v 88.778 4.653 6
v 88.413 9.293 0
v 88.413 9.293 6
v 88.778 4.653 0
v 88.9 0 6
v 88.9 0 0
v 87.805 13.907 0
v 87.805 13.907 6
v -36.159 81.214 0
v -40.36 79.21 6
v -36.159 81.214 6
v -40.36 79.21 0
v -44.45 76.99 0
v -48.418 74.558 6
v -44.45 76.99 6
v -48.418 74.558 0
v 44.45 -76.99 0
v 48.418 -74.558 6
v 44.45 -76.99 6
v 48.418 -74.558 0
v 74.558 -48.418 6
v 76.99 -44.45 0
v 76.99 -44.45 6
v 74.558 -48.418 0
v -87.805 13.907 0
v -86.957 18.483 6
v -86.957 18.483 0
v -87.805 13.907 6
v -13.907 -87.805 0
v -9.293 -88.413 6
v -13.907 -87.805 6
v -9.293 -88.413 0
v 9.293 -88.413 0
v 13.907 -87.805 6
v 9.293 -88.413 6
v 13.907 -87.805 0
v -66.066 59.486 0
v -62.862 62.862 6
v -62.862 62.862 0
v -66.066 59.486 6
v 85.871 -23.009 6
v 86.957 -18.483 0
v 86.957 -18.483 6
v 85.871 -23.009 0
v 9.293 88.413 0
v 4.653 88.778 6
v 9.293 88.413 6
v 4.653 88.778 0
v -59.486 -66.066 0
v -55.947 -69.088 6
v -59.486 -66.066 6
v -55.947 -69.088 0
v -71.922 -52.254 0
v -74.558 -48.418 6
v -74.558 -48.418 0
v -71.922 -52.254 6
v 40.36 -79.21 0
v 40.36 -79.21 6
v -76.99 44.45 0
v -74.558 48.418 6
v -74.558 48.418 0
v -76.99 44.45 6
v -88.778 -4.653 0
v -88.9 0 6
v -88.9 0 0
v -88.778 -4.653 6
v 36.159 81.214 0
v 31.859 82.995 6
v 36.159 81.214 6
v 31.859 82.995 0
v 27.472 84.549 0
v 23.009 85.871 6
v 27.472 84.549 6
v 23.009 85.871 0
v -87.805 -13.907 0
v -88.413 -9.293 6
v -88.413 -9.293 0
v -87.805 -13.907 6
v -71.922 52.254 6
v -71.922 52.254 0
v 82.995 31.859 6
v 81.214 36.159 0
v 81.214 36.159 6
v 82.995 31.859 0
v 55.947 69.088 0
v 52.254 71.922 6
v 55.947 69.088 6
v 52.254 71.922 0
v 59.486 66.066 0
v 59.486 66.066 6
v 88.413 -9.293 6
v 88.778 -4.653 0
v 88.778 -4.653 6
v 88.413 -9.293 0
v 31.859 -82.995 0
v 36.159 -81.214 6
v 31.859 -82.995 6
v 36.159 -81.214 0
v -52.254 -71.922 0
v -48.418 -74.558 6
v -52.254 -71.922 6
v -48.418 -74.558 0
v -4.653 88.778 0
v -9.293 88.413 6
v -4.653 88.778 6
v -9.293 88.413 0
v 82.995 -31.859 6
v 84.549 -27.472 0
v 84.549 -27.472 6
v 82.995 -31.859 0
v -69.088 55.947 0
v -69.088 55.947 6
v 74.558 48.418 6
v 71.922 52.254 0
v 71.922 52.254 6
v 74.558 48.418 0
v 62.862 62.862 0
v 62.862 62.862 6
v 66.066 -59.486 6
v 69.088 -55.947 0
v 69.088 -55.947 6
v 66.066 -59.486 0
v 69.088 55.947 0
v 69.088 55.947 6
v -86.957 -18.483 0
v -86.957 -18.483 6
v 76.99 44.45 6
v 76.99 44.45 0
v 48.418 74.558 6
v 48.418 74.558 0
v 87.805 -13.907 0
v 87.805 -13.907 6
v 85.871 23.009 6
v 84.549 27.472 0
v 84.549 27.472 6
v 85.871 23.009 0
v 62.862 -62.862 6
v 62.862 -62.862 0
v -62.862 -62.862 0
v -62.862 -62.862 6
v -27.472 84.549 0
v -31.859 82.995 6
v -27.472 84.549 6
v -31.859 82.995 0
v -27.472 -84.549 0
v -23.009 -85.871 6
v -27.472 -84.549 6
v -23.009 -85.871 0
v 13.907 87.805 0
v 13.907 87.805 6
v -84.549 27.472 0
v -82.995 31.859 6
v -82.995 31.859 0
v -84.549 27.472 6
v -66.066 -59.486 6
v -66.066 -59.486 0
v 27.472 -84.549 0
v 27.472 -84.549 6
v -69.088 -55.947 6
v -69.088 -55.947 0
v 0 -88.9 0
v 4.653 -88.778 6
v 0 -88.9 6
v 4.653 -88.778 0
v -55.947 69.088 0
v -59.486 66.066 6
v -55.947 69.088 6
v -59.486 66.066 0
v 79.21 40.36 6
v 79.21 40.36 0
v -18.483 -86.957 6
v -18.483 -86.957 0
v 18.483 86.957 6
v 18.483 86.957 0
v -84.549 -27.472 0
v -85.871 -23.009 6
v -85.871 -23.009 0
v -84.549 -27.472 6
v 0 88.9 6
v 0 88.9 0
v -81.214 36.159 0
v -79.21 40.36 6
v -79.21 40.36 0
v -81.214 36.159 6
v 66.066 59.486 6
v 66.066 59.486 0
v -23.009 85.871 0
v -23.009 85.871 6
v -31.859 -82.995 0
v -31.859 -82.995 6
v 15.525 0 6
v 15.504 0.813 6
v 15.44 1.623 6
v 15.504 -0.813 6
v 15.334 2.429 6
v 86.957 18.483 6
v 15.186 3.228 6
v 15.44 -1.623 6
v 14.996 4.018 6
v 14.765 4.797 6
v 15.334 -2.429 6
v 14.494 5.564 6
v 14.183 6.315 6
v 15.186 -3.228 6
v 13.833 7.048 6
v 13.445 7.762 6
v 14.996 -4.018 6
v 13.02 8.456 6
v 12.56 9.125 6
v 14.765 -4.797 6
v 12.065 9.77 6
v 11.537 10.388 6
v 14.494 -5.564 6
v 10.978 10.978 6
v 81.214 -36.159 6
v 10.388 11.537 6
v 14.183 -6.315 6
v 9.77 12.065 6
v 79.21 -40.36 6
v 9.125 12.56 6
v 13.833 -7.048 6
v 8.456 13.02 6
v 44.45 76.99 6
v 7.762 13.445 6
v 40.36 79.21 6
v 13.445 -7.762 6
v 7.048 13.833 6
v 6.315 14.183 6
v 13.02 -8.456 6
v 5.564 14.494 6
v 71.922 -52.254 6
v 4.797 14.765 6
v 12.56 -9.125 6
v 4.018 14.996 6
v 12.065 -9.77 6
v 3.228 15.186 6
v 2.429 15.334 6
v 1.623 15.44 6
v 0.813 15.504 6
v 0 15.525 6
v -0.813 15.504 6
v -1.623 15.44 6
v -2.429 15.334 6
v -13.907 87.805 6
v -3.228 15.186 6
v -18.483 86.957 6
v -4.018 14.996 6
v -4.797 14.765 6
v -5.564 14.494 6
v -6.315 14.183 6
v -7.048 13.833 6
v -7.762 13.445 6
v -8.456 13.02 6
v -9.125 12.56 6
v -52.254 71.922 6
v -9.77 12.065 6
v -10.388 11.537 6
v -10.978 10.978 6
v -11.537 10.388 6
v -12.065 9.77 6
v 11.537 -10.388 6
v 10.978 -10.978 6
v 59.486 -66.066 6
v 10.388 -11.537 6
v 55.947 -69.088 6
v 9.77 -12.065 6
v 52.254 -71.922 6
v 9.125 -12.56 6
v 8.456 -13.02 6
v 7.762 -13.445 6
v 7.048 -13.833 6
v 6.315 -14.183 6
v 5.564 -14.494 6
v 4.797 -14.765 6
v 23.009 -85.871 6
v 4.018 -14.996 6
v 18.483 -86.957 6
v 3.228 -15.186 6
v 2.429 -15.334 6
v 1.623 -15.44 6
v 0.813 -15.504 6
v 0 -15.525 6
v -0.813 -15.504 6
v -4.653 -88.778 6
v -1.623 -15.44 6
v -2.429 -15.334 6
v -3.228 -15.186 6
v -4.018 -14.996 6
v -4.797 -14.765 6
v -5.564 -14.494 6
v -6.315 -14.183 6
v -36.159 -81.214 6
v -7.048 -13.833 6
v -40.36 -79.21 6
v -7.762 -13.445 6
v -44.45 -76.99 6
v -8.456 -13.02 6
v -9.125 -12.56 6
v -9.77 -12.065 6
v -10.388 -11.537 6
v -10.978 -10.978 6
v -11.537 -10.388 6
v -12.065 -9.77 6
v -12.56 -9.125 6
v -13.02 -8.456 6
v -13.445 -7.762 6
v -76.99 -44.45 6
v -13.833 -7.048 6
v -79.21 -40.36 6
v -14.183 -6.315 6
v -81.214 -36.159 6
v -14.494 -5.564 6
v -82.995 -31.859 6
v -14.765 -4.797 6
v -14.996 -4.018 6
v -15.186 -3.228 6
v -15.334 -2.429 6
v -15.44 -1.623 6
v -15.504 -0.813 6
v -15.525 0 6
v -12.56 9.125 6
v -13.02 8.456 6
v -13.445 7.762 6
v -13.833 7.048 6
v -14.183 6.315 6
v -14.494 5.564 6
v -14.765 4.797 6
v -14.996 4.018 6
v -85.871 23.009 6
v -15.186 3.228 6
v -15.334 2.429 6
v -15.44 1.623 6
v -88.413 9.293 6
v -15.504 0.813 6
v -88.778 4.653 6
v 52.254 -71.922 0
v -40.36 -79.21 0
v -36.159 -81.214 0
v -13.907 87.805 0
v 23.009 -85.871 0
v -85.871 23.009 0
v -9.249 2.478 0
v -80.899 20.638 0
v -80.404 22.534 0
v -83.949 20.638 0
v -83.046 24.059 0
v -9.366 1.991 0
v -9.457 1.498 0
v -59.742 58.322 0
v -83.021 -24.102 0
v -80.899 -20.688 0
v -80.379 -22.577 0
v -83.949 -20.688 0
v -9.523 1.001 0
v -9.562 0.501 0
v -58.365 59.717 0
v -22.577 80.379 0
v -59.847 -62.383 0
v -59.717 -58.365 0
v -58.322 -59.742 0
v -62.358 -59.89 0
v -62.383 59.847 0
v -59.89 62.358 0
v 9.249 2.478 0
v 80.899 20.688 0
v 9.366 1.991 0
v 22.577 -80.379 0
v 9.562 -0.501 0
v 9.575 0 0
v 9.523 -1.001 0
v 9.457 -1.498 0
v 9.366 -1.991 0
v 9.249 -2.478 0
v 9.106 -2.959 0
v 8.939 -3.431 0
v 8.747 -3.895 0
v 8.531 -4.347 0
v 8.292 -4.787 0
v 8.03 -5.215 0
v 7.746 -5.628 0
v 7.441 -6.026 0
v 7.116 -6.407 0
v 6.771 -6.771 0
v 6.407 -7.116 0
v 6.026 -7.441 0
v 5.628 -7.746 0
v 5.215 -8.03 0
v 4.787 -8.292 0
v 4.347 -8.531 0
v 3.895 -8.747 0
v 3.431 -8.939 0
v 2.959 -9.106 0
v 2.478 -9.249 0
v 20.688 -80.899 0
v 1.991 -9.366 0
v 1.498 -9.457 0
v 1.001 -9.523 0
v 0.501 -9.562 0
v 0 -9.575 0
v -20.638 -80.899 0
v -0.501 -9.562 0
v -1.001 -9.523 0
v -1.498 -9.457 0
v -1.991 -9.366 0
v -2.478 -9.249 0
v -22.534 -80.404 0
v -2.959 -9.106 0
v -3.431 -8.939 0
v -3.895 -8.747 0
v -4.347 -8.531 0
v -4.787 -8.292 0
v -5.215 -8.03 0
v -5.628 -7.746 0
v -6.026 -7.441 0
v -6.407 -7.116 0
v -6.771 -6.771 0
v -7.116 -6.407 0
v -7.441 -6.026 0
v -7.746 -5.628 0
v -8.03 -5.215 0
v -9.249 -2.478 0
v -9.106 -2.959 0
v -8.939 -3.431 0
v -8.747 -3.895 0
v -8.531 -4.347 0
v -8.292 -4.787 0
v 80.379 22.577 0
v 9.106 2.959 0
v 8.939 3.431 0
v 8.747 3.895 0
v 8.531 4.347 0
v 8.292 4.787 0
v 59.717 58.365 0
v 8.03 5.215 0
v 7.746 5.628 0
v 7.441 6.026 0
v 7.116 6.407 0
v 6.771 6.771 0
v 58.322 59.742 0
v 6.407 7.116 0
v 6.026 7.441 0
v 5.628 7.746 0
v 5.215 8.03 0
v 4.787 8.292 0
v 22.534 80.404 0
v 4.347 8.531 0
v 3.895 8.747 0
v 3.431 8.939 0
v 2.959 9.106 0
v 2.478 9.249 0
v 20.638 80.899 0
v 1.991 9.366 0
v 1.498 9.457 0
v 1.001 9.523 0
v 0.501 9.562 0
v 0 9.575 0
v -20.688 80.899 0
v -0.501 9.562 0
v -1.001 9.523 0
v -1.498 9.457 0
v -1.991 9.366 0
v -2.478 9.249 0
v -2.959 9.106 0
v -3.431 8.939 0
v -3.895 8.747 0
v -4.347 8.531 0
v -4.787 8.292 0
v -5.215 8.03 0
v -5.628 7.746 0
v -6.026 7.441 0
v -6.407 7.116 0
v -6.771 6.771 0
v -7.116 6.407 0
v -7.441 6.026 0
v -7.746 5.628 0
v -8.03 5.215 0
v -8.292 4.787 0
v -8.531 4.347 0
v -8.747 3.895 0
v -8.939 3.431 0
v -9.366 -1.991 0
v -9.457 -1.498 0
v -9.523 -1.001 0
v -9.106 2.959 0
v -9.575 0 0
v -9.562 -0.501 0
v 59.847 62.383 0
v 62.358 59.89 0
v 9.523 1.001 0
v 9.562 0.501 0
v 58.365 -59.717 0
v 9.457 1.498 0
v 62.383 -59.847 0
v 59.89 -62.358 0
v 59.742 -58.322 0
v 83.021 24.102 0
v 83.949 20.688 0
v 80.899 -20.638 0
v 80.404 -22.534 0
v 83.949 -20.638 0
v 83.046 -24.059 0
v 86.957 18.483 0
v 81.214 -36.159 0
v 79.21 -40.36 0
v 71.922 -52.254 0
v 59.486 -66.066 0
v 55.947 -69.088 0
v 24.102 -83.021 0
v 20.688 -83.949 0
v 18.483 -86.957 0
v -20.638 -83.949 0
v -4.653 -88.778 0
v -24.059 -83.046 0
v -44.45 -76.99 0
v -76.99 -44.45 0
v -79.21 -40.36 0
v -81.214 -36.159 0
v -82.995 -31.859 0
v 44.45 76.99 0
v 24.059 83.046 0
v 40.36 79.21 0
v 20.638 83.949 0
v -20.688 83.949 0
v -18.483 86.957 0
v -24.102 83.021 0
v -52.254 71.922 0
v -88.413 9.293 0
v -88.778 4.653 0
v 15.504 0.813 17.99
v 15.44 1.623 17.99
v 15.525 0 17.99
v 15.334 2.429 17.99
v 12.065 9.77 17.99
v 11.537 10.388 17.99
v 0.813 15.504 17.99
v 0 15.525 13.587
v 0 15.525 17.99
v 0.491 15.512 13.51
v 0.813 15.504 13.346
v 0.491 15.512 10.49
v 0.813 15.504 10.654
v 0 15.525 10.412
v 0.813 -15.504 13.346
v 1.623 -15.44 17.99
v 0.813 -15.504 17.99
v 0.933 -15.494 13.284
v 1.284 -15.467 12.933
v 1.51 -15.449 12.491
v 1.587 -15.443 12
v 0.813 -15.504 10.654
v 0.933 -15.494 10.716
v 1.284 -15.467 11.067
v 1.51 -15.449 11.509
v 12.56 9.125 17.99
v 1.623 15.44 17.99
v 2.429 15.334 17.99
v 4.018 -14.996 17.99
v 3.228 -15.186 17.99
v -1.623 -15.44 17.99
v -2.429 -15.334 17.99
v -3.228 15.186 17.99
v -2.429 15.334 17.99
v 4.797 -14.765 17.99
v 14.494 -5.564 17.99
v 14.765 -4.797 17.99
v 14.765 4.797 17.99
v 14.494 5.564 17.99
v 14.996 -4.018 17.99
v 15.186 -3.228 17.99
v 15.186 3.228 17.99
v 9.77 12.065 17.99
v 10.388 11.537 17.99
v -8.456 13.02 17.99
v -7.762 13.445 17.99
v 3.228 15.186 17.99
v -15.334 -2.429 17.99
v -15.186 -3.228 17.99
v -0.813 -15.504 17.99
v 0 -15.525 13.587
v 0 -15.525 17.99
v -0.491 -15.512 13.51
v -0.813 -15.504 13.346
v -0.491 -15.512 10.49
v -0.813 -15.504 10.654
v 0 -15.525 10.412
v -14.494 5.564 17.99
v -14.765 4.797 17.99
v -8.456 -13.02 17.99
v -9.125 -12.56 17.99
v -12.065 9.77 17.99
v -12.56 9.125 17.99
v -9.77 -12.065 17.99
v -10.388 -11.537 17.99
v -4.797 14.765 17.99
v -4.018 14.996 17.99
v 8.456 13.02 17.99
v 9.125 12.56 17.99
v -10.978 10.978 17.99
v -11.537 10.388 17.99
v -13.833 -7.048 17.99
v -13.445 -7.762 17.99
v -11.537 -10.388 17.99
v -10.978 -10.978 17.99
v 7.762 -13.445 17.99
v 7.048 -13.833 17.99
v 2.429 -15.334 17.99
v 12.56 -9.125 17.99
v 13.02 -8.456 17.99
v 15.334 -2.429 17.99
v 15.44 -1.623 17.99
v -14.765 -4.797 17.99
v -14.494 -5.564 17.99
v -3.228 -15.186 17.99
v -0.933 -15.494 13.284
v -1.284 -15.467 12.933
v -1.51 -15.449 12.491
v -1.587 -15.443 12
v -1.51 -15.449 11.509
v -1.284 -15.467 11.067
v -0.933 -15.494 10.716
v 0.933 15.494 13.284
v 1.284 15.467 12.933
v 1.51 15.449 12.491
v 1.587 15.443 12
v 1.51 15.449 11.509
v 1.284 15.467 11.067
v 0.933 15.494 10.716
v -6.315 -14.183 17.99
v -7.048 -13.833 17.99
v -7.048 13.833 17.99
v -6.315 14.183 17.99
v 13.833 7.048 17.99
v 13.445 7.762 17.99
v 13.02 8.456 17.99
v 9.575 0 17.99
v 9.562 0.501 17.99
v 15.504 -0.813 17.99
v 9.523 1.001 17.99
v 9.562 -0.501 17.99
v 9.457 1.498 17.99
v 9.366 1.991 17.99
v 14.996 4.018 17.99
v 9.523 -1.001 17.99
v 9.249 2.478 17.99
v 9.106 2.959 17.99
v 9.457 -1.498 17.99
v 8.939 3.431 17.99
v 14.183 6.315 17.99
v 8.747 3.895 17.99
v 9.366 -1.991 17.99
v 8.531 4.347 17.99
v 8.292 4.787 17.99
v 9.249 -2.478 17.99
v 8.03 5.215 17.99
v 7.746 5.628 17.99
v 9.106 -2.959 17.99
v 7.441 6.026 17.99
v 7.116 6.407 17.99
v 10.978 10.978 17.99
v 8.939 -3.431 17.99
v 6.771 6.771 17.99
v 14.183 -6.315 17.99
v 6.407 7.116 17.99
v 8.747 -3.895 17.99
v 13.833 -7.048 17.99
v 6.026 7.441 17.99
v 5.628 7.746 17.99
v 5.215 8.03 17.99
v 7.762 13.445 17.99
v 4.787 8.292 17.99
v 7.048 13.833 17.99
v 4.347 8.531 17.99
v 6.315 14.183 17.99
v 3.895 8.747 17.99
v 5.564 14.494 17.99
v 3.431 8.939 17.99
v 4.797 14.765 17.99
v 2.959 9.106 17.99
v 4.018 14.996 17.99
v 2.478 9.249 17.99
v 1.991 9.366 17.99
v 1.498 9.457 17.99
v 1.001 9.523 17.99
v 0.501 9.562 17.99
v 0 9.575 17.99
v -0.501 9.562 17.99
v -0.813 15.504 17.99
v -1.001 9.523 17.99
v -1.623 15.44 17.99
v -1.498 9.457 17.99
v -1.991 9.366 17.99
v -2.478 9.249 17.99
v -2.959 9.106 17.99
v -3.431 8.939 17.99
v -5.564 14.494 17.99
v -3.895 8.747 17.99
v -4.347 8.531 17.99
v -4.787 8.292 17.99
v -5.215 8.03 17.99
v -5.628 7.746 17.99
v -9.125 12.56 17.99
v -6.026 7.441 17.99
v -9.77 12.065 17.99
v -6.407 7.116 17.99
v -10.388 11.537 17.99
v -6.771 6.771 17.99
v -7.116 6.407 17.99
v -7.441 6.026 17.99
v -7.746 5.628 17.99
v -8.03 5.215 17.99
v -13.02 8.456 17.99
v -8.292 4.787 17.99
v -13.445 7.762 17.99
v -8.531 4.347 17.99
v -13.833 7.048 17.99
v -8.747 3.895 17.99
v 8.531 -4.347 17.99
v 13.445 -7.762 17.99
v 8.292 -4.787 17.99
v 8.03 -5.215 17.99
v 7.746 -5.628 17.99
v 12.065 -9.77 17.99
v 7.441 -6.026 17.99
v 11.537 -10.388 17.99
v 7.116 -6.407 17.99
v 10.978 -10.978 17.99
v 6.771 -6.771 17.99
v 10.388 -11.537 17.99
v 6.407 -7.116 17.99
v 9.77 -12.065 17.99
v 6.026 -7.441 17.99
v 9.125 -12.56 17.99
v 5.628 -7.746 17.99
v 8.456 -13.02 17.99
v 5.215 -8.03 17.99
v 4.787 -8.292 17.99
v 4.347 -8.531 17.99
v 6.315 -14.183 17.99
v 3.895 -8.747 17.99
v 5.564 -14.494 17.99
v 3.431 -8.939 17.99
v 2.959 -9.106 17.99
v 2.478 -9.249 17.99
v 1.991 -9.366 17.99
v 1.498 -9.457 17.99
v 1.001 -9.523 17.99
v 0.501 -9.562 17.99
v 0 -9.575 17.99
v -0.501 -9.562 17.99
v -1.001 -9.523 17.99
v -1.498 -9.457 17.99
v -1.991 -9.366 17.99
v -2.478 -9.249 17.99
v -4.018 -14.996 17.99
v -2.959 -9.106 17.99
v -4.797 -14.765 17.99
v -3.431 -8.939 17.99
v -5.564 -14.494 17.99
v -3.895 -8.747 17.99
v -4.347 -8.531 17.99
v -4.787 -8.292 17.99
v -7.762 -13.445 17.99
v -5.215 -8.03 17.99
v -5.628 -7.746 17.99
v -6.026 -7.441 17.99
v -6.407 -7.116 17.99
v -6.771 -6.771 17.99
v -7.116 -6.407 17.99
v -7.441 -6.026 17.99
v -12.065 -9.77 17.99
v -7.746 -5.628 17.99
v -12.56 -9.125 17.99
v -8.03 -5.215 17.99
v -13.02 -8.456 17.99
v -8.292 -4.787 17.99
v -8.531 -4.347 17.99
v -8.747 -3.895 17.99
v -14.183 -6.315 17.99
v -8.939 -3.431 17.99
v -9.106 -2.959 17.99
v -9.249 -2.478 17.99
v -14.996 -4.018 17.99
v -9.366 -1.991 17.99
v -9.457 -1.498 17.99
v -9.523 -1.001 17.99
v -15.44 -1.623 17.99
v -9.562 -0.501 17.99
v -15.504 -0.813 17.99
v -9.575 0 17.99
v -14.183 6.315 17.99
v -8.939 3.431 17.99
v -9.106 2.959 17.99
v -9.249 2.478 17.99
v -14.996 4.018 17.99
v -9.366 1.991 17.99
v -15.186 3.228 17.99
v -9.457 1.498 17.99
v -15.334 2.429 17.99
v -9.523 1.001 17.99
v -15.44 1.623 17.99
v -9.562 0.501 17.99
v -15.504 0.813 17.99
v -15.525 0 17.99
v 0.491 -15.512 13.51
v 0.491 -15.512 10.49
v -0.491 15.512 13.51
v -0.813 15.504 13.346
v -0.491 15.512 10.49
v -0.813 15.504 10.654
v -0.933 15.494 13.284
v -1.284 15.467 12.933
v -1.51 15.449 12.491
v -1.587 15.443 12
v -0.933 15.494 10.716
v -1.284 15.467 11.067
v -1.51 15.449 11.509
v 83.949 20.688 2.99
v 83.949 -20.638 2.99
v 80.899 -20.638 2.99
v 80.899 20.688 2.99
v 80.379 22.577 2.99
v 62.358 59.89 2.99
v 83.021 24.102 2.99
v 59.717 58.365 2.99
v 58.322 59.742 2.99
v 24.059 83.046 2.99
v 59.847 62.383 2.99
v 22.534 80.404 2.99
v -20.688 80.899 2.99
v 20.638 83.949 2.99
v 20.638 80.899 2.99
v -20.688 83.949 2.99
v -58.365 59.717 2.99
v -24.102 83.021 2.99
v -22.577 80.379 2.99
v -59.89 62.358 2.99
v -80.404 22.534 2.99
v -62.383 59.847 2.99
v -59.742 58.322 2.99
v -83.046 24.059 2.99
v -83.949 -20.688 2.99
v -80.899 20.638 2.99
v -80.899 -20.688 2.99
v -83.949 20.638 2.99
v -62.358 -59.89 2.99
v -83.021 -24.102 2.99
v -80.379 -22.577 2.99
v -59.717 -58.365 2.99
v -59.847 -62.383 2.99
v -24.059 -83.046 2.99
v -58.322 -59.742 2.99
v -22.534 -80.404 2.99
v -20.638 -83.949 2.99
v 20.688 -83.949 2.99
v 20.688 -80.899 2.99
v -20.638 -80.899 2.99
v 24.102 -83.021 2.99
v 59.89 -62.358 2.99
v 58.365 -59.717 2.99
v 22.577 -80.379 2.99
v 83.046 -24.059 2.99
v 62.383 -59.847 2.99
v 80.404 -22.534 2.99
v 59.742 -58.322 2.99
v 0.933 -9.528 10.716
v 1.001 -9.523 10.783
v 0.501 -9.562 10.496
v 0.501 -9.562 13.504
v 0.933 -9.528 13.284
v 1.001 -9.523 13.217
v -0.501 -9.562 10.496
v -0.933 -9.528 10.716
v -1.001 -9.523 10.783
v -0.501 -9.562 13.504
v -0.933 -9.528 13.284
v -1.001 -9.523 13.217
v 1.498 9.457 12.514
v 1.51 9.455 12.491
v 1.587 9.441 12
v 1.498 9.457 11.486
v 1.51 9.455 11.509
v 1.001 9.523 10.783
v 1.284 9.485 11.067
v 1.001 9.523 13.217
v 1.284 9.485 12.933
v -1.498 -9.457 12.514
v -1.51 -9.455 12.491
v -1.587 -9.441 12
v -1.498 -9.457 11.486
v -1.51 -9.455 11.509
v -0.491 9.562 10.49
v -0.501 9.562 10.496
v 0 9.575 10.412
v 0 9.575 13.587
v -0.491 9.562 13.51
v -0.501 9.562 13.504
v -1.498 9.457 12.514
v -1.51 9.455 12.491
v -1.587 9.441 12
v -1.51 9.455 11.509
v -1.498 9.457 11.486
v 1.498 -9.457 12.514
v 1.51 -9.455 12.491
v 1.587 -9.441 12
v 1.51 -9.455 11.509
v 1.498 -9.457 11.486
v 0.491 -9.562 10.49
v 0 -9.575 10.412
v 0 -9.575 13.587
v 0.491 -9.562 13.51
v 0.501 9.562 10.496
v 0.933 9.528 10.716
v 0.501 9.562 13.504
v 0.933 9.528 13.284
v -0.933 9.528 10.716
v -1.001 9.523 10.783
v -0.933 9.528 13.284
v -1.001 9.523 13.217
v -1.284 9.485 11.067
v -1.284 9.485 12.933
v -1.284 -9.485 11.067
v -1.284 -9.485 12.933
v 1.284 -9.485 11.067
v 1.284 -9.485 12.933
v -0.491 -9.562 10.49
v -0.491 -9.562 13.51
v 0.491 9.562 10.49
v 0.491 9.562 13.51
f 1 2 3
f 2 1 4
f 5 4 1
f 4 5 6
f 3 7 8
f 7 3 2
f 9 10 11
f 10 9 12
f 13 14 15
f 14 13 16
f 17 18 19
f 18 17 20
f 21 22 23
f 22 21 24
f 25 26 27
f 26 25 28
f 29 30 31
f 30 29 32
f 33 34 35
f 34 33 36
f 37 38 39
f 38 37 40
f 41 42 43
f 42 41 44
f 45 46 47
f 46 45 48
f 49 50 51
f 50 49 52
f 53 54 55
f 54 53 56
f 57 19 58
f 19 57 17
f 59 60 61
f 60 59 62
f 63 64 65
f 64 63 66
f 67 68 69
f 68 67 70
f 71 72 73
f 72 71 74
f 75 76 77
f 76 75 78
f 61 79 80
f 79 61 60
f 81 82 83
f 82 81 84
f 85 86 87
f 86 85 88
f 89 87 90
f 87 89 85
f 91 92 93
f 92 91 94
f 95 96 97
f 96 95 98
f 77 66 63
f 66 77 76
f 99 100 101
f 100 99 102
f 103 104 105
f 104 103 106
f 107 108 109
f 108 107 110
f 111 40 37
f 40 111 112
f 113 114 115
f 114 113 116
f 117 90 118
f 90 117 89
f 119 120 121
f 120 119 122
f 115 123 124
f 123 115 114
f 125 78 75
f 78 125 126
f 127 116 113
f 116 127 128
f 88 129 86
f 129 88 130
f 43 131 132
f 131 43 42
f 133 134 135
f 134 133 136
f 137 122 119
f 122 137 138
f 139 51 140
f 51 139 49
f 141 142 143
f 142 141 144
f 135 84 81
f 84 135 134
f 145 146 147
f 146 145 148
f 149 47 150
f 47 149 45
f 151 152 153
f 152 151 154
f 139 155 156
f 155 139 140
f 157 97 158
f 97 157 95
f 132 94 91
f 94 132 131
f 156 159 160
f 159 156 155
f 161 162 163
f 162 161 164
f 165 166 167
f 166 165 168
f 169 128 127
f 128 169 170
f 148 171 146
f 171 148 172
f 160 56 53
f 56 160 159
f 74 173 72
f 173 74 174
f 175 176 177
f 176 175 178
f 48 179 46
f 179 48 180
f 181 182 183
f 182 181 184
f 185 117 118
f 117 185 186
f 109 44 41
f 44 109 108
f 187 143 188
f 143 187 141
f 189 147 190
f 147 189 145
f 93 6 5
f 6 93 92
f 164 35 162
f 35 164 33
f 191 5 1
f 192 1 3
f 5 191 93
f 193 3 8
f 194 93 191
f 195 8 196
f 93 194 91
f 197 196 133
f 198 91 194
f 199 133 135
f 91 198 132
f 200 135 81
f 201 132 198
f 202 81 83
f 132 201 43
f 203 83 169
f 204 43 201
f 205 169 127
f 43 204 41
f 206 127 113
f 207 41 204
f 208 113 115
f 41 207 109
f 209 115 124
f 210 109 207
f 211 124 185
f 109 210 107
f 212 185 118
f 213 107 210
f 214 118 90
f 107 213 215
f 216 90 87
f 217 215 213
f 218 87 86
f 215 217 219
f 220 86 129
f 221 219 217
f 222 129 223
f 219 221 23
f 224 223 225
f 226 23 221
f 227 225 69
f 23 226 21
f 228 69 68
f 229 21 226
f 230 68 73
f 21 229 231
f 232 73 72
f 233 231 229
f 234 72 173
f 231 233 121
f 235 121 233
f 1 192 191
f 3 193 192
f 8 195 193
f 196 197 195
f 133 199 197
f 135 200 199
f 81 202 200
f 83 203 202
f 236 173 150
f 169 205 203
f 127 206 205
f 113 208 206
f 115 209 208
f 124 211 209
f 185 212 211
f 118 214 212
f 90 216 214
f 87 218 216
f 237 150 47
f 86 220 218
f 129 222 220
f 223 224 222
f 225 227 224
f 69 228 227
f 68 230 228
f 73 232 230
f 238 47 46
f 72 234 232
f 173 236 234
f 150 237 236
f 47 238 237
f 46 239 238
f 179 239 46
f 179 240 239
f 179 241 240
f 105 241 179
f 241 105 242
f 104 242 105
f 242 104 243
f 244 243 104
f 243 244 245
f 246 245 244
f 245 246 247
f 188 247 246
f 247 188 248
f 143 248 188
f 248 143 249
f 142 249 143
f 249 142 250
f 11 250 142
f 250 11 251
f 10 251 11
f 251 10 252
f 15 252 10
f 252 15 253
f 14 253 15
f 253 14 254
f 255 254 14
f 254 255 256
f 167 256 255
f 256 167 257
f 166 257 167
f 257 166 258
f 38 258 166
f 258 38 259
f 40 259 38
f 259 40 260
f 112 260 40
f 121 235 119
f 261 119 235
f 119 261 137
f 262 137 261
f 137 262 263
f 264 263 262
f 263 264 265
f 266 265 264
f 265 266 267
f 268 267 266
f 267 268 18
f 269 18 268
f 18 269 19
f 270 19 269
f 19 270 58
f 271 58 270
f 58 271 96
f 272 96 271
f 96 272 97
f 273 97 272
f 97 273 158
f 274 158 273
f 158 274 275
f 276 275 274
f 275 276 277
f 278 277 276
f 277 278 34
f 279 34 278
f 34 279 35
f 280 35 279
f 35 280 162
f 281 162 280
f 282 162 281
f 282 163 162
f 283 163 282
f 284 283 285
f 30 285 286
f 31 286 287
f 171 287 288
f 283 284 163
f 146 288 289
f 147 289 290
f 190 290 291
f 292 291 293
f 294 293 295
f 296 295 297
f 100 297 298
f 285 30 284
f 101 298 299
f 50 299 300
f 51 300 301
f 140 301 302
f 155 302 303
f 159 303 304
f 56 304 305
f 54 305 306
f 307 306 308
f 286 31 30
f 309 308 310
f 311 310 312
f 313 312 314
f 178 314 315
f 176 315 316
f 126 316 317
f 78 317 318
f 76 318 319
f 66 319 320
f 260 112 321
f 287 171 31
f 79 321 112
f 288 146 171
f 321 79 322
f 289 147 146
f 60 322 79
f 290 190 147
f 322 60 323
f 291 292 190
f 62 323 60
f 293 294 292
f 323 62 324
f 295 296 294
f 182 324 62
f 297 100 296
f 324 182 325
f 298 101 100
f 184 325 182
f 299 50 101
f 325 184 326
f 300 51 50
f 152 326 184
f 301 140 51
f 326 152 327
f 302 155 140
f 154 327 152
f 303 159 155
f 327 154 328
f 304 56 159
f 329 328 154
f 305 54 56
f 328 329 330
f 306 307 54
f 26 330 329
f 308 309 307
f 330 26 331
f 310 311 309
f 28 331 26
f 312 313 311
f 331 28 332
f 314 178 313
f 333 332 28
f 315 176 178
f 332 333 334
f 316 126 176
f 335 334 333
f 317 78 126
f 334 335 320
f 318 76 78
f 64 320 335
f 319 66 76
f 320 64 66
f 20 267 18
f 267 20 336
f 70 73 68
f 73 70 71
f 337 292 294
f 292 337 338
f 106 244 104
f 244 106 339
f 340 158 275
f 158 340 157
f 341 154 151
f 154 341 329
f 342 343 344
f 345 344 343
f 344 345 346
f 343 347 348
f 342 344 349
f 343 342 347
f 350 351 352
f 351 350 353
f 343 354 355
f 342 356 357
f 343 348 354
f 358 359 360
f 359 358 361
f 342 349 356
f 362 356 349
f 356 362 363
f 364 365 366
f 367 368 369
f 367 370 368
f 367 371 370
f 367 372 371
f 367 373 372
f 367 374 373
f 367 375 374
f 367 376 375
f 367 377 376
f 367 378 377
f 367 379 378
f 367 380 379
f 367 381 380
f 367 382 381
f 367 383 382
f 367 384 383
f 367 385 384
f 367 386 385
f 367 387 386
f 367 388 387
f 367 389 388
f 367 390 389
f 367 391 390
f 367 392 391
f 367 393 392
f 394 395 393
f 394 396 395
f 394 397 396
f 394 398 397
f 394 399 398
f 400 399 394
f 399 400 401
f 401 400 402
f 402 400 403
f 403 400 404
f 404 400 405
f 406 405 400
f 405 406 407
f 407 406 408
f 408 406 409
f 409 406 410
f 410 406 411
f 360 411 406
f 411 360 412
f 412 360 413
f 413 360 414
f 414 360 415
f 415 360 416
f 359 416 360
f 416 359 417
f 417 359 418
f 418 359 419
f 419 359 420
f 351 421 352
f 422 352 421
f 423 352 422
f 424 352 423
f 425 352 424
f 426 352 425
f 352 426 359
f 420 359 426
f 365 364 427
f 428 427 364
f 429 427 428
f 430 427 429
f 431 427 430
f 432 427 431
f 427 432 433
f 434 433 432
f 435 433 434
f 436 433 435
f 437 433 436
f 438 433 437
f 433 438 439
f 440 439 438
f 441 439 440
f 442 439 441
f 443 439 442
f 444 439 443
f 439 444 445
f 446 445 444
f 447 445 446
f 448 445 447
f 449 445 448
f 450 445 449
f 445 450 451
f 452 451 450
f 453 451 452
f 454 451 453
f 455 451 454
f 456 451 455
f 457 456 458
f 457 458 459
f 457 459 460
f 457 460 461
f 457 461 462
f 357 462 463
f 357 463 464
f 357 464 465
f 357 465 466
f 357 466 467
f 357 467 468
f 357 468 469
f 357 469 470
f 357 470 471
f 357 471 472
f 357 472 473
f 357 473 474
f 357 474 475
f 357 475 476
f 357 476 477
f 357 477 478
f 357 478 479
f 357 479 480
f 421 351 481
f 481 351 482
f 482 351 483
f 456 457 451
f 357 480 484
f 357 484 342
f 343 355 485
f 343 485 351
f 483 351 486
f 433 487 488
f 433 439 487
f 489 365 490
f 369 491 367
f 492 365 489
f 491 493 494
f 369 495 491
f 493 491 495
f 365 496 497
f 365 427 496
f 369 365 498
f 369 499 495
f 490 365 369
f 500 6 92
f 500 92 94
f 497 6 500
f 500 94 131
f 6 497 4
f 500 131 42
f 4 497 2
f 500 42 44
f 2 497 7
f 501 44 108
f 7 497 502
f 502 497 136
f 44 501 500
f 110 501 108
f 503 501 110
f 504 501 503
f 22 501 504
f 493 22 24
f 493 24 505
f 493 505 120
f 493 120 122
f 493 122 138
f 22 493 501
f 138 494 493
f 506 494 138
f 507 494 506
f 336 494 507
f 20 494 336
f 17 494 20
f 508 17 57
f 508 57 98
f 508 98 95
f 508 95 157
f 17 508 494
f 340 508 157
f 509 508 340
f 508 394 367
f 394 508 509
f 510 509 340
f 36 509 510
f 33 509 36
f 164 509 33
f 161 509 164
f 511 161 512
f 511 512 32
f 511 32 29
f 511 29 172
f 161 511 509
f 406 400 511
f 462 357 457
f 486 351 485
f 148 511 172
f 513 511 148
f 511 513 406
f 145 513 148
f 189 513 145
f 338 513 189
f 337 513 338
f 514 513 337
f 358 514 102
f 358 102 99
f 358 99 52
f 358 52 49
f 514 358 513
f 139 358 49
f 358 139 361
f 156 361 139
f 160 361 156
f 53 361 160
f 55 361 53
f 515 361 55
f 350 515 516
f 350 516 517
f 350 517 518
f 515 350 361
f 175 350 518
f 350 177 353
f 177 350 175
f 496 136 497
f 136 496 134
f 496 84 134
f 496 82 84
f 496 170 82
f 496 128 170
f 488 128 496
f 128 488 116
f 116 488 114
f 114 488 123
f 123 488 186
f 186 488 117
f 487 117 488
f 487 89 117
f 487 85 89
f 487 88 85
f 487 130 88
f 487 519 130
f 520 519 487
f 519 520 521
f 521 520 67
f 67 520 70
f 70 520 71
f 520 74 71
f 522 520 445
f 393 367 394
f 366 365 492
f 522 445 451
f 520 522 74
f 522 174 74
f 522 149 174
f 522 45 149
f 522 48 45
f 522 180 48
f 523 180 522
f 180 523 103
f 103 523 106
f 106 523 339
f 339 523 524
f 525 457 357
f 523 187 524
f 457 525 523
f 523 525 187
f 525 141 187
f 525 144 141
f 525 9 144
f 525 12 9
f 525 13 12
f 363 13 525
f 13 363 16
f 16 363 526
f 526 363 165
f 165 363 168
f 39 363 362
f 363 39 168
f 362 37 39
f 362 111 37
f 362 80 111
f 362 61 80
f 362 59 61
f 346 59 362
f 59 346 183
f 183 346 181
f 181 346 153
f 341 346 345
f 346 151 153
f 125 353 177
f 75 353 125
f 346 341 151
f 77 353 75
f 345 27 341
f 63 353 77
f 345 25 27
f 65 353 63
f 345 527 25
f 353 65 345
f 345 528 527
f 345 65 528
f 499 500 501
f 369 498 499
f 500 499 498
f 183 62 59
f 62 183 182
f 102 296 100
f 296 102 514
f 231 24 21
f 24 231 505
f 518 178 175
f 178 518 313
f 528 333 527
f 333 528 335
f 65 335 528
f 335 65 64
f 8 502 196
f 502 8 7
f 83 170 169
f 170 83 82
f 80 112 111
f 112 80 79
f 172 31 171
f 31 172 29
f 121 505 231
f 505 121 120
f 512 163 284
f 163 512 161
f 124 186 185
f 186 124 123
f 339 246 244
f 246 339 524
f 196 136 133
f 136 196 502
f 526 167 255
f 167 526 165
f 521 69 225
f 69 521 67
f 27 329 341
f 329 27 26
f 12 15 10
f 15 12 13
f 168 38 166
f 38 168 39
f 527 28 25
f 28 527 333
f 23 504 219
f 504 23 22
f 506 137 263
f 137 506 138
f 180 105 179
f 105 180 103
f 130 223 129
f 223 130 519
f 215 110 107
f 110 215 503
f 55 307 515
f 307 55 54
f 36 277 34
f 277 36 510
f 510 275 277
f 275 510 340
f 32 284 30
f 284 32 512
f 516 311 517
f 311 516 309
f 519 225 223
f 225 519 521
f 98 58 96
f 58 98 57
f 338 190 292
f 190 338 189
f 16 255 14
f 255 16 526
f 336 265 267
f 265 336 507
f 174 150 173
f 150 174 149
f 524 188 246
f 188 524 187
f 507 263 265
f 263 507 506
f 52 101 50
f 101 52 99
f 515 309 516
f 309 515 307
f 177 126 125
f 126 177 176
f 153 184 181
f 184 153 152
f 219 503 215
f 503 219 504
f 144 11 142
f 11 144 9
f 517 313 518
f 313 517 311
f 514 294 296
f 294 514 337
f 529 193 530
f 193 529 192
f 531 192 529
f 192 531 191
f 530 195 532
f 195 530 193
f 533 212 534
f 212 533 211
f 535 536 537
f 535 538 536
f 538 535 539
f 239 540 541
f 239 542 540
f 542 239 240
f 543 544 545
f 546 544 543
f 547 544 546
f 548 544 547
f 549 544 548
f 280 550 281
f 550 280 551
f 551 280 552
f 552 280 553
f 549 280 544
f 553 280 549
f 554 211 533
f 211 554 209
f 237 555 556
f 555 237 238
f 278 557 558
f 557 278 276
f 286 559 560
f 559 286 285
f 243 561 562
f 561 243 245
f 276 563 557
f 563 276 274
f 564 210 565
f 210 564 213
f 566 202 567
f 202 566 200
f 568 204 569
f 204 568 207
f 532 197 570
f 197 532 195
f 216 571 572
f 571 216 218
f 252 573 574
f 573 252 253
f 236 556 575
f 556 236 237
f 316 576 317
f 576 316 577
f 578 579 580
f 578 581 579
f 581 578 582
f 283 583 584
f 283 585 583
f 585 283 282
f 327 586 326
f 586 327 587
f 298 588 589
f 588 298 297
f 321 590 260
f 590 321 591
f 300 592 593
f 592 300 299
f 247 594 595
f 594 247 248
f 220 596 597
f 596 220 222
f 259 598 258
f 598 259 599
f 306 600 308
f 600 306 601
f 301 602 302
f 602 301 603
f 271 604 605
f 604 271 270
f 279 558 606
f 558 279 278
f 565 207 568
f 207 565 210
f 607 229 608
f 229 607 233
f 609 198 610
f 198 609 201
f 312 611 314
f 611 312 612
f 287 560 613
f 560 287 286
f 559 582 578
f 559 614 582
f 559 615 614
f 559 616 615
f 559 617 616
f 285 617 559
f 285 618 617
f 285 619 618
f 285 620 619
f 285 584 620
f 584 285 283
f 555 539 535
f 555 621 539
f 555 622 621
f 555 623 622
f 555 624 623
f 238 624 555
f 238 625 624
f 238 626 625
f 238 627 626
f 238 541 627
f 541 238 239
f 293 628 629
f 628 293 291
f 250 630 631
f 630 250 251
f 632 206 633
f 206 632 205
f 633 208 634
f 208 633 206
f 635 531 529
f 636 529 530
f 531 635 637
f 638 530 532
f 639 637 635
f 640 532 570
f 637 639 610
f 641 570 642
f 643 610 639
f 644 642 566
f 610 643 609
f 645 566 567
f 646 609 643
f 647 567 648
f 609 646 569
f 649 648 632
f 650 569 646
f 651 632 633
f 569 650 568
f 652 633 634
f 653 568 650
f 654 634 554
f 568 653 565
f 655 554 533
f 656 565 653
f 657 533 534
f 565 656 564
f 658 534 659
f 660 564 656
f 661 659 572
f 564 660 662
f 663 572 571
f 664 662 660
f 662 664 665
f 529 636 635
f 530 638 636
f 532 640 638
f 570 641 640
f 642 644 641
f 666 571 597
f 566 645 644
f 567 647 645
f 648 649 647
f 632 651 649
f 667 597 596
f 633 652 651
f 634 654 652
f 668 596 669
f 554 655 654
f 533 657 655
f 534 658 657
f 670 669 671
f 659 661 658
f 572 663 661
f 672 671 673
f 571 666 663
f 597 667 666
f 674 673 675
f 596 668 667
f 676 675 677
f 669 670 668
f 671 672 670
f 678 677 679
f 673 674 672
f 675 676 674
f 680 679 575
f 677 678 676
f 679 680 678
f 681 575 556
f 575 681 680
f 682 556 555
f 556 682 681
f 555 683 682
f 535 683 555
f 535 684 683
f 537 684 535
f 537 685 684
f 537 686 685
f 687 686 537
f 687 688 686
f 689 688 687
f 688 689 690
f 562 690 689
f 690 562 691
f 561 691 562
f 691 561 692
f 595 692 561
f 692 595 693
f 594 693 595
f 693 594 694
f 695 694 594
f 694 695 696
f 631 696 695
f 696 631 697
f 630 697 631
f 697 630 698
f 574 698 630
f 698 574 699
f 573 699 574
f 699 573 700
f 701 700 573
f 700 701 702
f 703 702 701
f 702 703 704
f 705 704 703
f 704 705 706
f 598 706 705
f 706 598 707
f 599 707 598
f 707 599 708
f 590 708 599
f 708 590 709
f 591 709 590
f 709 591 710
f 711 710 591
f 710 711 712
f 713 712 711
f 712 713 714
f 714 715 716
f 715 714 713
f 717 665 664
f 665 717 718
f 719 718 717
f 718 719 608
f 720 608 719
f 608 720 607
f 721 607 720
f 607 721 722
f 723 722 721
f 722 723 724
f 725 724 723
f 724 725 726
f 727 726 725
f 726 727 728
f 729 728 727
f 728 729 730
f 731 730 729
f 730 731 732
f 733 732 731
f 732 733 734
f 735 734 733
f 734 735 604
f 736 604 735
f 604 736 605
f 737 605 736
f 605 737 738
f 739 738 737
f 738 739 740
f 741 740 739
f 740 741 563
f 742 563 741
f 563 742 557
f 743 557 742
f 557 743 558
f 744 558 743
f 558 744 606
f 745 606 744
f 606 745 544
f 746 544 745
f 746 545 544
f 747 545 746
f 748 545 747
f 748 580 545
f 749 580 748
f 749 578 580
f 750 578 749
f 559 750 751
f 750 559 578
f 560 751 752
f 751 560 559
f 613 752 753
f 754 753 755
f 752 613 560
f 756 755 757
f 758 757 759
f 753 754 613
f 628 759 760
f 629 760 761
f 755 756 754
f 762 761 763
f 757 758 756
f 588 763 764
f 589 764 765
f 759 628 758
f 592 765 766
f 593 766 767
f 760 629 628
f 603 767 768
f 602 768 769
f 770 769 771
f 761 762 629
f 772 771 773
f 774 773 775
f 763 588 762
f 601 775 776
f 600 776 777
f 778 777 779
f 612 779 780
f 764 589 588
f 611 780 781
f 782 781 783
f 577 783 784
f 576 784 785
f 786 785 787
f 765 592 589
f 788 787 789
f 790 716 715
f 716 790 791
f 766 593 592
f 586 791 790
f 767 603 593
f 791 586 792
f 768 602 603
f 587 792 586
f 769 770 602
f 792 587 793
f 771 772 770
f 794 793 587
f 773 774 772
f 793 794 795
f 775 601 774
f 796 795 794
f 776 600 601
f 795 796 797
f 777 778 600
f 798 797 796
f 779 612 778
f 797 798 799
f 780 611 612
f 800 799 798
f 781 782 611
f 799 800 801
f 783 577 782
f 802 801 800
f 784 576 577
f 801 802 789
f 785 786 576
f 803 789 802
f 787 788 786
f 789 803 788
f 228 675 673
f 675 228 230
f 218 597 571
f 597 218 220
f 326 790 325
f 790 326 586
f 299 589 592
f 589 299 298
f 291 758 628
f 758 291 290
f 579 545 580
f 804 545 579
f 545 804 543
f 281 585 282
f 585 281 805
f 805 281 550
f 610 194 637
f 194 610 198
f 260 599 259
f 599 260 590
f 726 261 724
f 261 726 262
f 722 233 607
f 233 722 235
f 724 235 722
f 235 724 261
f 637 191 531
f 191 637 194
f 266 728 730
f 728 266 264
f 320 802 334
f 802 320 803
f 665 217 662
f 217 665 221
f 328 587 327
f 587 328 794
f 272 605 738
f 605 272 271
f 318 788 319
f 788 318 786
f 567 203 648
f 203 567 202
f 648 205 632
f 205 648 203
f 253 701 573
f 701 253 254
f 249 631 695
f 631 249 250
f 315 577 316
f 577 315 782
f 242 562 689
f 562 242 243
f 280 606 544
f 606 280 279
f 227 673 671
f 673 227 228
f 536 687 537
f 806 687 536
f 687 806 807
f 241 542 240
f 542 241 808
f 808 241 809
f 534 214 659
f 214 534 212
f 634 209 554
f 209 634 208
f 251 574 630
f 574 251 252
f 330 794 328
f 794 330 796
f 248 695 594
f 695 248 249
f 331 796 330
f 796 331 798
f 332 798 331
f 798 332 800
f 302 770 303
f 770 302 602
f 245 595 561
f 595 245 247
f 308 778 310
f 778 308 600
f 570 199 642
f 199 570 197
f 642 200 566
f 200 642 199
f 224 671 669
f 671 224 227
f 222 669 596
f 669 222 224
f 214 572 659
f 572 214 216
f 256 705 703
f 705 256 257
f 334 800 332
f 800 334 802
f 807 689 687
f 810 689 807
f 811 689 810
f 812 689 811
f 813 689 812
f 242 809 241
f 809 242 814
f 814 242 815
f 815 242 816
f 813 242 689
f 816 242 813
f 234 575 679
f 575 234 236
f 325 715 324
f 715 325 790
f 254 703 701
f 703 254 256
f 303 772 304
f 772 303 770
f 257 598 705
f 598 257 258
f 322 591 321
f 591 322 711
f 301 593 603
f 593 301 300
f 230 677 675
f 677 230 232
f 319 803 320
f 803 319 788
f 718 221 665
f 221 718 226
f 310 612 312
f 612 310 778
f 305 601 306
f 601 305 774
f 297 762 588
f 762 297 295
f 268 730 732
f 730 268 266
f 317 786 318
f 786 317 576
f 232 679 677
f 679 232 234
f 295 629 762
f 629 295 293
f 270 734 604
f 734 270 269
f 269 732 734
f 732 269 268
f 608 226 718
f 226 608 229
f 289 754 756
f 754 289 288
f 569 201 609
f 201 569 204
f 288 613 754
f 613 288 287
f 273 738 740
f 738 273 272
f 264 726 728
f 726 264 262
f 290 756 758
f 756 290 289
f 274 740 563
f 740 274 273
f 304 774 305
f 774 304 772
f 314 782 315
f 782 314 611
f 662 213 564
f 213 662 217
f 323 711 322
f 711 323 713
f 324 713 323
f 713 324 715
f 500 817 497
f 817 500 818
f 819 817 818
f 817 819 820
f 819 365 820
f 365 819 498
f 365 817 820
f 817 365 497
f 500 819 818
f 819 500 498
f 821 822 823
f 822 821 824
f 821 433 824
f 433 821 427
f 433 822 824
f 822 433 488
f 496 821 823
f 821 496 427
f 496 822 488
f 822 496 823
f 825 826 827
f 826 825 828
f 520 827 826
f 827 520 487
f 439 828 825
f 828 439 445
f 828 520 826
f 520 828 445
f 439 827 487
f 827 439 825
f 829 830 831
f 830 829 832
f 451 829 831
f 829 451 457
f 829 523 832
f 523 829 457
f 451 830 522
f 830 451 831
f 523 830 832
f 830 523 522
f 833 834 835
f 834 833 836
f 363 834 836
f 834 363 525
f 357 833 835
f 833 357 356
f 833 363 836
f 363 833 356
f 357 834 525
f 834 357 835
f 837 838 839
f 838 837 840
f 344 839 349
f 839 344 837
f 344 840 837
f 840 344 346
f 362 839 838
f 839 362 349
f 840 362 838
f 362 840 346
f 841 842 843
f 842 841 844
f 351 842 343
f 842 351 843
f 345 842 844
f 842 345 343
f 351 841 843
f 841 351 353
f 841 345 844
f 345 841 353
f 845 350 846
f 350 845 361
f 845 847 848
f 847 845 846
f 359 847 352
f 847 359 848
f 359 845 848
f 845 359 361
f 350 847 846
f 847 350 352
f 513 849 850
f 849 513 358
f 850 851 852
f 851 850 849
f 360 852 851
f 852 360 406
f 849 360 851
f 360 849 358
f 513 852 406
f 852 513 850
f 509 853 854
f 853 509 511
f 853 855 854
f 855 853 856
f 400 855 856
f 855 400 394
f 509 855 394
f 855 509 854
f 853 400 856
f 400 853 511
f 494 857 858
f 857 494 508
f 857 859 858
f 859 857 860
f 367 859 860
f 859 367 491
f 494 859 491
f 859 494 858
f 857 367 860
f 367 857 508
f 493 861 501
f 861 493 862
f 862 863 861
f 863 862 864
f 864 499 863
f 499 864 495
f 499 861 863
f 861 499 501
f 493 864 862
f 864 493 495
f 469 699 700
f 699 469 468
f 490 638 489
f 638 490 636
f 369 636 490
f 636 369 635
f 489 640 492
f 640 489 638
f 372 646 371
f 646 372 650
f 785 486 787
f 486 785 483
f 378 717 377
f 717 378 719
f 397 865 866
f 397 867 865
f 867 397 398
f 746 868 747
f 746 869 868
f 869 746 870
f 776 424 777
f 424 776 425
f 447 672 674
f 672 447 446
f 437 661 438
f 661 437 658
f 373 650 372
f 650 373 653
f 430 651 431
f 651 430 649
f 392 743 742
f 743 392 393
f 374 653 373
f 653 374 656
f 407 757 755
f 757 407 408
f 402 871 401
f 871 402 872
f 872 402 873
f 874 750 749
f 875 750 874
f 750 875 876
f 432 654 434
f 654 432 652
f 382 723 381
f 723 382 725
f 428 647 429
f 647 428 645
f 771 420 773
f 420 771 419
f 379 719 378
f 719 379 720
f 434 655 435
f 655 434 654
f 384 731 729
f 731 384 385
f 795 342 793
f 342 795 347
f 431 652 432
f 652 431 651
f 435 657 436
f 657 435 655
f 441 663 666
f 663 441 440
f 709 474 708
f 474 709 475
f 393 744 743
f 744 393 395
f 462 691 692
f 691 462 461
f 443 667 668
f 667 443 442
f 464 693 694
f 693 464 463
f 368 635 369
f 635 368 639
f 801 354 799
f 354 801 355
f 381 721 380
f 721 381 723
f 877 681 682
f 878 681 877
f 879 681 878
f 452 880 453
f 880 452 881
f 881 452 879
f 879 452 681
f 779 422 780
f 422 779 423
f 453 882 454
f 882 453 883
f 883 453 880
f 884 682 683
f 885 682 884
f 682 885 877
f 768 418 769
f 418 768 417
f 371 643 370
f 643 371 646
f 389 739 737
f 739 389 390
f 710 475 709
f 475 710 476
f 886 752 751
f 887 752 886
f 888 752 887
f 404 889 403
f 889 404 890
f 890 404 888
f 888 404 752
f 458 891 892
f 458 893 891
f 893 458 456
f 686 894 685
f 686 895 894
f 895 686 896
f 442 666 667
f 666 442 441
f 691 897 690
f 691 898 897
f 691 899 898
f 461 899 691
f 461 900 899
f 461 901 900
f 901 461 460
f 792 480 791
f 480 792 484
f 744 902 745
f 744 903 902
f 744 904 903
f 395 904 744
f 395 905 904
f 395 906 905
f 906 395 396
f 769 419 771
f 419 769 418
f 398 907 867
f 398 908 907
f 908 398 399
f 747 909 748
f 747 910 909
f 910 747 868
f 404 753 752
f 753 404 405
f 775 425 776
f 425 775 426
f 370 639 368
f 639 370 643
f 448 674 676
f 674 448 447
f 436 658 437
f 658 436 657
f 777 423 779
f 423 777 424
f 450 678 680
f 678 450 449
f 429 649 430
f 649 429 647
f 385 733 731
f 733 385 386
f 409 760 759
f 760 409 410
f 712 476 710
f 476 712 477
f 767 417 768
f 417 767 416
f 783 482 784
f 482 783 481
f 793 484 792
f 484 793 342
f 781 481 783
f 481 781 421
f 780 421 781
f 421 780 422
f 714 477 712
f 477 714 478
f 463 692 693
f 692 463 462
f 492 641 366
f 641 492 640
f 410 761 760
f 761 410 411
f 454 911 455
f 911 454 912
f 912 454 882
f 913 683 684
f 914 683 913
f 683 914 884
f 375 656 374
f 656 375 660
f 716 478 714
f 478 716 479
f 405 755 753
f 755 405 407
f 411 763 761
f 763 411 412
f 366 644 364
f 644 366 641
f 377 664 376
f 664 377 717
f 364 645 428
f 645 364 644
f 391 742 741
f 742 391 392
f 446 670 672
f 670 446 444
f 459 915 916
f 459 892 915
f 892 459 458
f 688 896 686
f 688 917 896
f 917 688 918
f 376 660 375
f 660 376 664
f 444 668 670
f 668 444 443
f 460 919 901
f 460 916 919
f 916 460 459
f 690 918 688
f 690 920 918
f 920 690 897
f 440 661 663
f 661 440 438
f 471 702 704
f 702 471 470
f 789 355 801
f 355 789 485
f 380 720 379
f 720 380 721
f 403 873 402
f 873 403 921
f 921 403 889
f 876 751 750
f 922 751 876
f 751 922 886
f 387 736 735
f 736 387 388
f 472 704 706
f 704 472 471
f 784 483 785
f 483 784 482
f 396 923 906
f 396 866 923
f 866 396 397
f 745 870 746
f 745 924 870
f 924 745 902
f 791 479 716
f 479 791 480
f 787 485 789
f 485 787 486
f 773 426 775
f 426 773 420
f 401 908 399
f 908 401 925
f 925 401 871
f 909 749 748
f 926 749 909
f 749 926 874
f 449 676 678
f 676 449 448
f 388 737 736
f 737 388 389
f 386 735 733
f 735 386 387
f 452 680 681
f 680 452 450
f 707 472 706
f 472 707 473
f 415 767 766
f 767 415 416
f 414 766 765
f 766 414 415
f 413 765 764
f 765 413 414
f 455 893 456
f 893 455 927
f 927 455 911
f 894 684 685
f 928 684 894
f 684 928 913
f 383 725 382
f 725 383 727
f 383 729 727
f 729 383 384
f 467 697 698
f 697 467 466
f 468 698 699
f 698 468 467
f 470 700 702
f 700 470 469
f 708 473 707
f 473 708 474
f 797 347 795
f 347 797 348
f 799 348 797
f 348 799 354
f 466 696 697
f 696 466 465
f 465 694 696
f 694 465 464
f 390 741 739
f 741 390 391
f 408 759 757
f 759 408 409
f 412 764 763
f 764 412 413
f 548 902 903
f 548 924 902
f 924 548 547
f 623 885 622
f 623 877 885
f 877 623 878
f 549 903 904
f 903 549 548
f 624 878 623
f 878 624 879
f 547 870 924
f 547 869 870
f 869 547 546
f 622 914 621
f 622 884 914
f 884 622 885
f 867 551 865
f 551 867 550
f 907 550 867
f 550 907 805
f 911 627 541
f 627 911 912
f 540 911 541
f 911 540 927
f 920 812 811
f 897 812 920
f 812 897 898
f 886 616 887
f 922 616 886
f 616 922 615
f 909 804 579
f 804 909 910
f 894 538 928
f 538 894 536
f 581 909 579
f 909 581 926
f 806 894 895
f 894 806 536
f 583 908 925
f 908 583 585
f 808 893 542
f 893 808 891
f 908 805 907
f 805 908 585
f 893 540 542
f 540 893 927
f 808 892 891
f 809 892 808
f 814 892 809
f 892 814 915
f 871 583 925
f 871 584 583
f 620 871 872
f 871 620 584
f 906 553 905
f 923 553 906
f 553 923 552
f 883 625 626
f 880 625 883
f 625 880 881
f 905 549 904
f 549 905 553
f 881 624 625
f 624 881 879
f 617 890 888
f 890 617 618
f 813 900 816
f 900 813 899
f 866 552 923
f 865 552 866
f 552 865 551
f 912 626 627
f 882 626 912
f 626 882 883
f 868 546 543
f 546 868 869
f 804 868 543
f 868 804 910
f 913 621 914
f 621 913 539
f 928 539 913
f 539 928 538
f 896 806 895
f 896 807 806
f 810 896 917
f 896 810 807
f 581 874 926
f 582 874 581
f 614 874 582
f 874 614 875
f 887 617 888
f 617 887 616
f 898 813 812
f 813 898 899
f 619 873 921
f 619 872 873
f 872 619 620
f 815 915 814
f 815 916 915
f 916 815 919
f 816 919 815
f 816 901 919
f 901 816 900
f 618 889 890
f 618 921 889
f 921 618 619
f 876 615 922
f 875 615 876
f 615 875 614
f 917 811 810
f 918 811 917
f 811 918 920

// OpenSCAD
//This is an openscad part used as a flange to connect a zoetrope to a shaft


//render
upper_flange();

//===========Parameters===========

num_frames = 12; //total number of frames to make cutouts for
panel_width = 1.625*25.4;  //size of each panel

//===========Geometry============
clearance = 0.05; //mm - amount to oversize holes so that parts will assemble

d_shaft = .75*25.4; //0.75" shaft diameter in mm
d_mag = 0.0625*25.4; //  diamete of magnets in mm
d_pin = 0.125*25.4; // diameter of pins used to hold shaft to flange
d_flange = 7*25.4; // outer diameter of the flange 
t_flange = 6; //thickness of the flang in mm
t_hub = 6; //thickness of the material around the hub
h_hub = 12; //height of the hub from the surface of the flange
edge_space = 5; //mm from the edge of the flange to the closest part of the frame

t_panel = 3;//mm how thick each panel is
panel_cut = 3; //mm how deep of a recess to cut for each panel


fudge = 0.01; //mm - use this value to make sure surfaces aren't coincident
//===========Modules=============
module upper_flange(){
    difference(){
        //Make the core of the flange
        union(){
            //This makes the base of the flange
            cylinder(r = d_flange/2, h= t_flange, $fn = 120);
            //This makes the hub
            translate([0,0,t_flange-fudge])
            cylinder(r = d_shaft/2+t_hub, h = h_hub, $fn = 120);
        }
        //Then subtract things from it
        
        //Subtract the hole for the shaft
        translate([0,0,-fudge])
        cylinder(r = d_shaft/2+clearance,h = t_flange+h_hub+2*fudge,$fn = 120);
        
        //cut a pin to register the flange to the shaft
               
        translate([0,0,t_flange+h_hub/2])
        rotate([90,0,0]) 
        cylinder(r=d_pin/2,h=5*d_shaft+2*t_hub+2*fudge,$fn=20,center=true);
        //subtract the holes for the frames
        for (i=[0:1]){
            cord_calc(i);
            
            
        }
        
 
            
    }
    
  
    
    
    
    
}
module cord_calc(i){
    theta = 2*3.1415/num_frames;
    r_panel = (d_flange/2-edge_space)*cos(theta/2)-t_panel;
    for ( i = [0:num_frames-1] ) {
        rotate([0,0,i*theta*180/3.1415])
        translate([r_panel,-panel_width/2,-fudge])
        cube([t_panel+clearance,panel_width+clearance,panel_cut]);
    }
        
    
}
